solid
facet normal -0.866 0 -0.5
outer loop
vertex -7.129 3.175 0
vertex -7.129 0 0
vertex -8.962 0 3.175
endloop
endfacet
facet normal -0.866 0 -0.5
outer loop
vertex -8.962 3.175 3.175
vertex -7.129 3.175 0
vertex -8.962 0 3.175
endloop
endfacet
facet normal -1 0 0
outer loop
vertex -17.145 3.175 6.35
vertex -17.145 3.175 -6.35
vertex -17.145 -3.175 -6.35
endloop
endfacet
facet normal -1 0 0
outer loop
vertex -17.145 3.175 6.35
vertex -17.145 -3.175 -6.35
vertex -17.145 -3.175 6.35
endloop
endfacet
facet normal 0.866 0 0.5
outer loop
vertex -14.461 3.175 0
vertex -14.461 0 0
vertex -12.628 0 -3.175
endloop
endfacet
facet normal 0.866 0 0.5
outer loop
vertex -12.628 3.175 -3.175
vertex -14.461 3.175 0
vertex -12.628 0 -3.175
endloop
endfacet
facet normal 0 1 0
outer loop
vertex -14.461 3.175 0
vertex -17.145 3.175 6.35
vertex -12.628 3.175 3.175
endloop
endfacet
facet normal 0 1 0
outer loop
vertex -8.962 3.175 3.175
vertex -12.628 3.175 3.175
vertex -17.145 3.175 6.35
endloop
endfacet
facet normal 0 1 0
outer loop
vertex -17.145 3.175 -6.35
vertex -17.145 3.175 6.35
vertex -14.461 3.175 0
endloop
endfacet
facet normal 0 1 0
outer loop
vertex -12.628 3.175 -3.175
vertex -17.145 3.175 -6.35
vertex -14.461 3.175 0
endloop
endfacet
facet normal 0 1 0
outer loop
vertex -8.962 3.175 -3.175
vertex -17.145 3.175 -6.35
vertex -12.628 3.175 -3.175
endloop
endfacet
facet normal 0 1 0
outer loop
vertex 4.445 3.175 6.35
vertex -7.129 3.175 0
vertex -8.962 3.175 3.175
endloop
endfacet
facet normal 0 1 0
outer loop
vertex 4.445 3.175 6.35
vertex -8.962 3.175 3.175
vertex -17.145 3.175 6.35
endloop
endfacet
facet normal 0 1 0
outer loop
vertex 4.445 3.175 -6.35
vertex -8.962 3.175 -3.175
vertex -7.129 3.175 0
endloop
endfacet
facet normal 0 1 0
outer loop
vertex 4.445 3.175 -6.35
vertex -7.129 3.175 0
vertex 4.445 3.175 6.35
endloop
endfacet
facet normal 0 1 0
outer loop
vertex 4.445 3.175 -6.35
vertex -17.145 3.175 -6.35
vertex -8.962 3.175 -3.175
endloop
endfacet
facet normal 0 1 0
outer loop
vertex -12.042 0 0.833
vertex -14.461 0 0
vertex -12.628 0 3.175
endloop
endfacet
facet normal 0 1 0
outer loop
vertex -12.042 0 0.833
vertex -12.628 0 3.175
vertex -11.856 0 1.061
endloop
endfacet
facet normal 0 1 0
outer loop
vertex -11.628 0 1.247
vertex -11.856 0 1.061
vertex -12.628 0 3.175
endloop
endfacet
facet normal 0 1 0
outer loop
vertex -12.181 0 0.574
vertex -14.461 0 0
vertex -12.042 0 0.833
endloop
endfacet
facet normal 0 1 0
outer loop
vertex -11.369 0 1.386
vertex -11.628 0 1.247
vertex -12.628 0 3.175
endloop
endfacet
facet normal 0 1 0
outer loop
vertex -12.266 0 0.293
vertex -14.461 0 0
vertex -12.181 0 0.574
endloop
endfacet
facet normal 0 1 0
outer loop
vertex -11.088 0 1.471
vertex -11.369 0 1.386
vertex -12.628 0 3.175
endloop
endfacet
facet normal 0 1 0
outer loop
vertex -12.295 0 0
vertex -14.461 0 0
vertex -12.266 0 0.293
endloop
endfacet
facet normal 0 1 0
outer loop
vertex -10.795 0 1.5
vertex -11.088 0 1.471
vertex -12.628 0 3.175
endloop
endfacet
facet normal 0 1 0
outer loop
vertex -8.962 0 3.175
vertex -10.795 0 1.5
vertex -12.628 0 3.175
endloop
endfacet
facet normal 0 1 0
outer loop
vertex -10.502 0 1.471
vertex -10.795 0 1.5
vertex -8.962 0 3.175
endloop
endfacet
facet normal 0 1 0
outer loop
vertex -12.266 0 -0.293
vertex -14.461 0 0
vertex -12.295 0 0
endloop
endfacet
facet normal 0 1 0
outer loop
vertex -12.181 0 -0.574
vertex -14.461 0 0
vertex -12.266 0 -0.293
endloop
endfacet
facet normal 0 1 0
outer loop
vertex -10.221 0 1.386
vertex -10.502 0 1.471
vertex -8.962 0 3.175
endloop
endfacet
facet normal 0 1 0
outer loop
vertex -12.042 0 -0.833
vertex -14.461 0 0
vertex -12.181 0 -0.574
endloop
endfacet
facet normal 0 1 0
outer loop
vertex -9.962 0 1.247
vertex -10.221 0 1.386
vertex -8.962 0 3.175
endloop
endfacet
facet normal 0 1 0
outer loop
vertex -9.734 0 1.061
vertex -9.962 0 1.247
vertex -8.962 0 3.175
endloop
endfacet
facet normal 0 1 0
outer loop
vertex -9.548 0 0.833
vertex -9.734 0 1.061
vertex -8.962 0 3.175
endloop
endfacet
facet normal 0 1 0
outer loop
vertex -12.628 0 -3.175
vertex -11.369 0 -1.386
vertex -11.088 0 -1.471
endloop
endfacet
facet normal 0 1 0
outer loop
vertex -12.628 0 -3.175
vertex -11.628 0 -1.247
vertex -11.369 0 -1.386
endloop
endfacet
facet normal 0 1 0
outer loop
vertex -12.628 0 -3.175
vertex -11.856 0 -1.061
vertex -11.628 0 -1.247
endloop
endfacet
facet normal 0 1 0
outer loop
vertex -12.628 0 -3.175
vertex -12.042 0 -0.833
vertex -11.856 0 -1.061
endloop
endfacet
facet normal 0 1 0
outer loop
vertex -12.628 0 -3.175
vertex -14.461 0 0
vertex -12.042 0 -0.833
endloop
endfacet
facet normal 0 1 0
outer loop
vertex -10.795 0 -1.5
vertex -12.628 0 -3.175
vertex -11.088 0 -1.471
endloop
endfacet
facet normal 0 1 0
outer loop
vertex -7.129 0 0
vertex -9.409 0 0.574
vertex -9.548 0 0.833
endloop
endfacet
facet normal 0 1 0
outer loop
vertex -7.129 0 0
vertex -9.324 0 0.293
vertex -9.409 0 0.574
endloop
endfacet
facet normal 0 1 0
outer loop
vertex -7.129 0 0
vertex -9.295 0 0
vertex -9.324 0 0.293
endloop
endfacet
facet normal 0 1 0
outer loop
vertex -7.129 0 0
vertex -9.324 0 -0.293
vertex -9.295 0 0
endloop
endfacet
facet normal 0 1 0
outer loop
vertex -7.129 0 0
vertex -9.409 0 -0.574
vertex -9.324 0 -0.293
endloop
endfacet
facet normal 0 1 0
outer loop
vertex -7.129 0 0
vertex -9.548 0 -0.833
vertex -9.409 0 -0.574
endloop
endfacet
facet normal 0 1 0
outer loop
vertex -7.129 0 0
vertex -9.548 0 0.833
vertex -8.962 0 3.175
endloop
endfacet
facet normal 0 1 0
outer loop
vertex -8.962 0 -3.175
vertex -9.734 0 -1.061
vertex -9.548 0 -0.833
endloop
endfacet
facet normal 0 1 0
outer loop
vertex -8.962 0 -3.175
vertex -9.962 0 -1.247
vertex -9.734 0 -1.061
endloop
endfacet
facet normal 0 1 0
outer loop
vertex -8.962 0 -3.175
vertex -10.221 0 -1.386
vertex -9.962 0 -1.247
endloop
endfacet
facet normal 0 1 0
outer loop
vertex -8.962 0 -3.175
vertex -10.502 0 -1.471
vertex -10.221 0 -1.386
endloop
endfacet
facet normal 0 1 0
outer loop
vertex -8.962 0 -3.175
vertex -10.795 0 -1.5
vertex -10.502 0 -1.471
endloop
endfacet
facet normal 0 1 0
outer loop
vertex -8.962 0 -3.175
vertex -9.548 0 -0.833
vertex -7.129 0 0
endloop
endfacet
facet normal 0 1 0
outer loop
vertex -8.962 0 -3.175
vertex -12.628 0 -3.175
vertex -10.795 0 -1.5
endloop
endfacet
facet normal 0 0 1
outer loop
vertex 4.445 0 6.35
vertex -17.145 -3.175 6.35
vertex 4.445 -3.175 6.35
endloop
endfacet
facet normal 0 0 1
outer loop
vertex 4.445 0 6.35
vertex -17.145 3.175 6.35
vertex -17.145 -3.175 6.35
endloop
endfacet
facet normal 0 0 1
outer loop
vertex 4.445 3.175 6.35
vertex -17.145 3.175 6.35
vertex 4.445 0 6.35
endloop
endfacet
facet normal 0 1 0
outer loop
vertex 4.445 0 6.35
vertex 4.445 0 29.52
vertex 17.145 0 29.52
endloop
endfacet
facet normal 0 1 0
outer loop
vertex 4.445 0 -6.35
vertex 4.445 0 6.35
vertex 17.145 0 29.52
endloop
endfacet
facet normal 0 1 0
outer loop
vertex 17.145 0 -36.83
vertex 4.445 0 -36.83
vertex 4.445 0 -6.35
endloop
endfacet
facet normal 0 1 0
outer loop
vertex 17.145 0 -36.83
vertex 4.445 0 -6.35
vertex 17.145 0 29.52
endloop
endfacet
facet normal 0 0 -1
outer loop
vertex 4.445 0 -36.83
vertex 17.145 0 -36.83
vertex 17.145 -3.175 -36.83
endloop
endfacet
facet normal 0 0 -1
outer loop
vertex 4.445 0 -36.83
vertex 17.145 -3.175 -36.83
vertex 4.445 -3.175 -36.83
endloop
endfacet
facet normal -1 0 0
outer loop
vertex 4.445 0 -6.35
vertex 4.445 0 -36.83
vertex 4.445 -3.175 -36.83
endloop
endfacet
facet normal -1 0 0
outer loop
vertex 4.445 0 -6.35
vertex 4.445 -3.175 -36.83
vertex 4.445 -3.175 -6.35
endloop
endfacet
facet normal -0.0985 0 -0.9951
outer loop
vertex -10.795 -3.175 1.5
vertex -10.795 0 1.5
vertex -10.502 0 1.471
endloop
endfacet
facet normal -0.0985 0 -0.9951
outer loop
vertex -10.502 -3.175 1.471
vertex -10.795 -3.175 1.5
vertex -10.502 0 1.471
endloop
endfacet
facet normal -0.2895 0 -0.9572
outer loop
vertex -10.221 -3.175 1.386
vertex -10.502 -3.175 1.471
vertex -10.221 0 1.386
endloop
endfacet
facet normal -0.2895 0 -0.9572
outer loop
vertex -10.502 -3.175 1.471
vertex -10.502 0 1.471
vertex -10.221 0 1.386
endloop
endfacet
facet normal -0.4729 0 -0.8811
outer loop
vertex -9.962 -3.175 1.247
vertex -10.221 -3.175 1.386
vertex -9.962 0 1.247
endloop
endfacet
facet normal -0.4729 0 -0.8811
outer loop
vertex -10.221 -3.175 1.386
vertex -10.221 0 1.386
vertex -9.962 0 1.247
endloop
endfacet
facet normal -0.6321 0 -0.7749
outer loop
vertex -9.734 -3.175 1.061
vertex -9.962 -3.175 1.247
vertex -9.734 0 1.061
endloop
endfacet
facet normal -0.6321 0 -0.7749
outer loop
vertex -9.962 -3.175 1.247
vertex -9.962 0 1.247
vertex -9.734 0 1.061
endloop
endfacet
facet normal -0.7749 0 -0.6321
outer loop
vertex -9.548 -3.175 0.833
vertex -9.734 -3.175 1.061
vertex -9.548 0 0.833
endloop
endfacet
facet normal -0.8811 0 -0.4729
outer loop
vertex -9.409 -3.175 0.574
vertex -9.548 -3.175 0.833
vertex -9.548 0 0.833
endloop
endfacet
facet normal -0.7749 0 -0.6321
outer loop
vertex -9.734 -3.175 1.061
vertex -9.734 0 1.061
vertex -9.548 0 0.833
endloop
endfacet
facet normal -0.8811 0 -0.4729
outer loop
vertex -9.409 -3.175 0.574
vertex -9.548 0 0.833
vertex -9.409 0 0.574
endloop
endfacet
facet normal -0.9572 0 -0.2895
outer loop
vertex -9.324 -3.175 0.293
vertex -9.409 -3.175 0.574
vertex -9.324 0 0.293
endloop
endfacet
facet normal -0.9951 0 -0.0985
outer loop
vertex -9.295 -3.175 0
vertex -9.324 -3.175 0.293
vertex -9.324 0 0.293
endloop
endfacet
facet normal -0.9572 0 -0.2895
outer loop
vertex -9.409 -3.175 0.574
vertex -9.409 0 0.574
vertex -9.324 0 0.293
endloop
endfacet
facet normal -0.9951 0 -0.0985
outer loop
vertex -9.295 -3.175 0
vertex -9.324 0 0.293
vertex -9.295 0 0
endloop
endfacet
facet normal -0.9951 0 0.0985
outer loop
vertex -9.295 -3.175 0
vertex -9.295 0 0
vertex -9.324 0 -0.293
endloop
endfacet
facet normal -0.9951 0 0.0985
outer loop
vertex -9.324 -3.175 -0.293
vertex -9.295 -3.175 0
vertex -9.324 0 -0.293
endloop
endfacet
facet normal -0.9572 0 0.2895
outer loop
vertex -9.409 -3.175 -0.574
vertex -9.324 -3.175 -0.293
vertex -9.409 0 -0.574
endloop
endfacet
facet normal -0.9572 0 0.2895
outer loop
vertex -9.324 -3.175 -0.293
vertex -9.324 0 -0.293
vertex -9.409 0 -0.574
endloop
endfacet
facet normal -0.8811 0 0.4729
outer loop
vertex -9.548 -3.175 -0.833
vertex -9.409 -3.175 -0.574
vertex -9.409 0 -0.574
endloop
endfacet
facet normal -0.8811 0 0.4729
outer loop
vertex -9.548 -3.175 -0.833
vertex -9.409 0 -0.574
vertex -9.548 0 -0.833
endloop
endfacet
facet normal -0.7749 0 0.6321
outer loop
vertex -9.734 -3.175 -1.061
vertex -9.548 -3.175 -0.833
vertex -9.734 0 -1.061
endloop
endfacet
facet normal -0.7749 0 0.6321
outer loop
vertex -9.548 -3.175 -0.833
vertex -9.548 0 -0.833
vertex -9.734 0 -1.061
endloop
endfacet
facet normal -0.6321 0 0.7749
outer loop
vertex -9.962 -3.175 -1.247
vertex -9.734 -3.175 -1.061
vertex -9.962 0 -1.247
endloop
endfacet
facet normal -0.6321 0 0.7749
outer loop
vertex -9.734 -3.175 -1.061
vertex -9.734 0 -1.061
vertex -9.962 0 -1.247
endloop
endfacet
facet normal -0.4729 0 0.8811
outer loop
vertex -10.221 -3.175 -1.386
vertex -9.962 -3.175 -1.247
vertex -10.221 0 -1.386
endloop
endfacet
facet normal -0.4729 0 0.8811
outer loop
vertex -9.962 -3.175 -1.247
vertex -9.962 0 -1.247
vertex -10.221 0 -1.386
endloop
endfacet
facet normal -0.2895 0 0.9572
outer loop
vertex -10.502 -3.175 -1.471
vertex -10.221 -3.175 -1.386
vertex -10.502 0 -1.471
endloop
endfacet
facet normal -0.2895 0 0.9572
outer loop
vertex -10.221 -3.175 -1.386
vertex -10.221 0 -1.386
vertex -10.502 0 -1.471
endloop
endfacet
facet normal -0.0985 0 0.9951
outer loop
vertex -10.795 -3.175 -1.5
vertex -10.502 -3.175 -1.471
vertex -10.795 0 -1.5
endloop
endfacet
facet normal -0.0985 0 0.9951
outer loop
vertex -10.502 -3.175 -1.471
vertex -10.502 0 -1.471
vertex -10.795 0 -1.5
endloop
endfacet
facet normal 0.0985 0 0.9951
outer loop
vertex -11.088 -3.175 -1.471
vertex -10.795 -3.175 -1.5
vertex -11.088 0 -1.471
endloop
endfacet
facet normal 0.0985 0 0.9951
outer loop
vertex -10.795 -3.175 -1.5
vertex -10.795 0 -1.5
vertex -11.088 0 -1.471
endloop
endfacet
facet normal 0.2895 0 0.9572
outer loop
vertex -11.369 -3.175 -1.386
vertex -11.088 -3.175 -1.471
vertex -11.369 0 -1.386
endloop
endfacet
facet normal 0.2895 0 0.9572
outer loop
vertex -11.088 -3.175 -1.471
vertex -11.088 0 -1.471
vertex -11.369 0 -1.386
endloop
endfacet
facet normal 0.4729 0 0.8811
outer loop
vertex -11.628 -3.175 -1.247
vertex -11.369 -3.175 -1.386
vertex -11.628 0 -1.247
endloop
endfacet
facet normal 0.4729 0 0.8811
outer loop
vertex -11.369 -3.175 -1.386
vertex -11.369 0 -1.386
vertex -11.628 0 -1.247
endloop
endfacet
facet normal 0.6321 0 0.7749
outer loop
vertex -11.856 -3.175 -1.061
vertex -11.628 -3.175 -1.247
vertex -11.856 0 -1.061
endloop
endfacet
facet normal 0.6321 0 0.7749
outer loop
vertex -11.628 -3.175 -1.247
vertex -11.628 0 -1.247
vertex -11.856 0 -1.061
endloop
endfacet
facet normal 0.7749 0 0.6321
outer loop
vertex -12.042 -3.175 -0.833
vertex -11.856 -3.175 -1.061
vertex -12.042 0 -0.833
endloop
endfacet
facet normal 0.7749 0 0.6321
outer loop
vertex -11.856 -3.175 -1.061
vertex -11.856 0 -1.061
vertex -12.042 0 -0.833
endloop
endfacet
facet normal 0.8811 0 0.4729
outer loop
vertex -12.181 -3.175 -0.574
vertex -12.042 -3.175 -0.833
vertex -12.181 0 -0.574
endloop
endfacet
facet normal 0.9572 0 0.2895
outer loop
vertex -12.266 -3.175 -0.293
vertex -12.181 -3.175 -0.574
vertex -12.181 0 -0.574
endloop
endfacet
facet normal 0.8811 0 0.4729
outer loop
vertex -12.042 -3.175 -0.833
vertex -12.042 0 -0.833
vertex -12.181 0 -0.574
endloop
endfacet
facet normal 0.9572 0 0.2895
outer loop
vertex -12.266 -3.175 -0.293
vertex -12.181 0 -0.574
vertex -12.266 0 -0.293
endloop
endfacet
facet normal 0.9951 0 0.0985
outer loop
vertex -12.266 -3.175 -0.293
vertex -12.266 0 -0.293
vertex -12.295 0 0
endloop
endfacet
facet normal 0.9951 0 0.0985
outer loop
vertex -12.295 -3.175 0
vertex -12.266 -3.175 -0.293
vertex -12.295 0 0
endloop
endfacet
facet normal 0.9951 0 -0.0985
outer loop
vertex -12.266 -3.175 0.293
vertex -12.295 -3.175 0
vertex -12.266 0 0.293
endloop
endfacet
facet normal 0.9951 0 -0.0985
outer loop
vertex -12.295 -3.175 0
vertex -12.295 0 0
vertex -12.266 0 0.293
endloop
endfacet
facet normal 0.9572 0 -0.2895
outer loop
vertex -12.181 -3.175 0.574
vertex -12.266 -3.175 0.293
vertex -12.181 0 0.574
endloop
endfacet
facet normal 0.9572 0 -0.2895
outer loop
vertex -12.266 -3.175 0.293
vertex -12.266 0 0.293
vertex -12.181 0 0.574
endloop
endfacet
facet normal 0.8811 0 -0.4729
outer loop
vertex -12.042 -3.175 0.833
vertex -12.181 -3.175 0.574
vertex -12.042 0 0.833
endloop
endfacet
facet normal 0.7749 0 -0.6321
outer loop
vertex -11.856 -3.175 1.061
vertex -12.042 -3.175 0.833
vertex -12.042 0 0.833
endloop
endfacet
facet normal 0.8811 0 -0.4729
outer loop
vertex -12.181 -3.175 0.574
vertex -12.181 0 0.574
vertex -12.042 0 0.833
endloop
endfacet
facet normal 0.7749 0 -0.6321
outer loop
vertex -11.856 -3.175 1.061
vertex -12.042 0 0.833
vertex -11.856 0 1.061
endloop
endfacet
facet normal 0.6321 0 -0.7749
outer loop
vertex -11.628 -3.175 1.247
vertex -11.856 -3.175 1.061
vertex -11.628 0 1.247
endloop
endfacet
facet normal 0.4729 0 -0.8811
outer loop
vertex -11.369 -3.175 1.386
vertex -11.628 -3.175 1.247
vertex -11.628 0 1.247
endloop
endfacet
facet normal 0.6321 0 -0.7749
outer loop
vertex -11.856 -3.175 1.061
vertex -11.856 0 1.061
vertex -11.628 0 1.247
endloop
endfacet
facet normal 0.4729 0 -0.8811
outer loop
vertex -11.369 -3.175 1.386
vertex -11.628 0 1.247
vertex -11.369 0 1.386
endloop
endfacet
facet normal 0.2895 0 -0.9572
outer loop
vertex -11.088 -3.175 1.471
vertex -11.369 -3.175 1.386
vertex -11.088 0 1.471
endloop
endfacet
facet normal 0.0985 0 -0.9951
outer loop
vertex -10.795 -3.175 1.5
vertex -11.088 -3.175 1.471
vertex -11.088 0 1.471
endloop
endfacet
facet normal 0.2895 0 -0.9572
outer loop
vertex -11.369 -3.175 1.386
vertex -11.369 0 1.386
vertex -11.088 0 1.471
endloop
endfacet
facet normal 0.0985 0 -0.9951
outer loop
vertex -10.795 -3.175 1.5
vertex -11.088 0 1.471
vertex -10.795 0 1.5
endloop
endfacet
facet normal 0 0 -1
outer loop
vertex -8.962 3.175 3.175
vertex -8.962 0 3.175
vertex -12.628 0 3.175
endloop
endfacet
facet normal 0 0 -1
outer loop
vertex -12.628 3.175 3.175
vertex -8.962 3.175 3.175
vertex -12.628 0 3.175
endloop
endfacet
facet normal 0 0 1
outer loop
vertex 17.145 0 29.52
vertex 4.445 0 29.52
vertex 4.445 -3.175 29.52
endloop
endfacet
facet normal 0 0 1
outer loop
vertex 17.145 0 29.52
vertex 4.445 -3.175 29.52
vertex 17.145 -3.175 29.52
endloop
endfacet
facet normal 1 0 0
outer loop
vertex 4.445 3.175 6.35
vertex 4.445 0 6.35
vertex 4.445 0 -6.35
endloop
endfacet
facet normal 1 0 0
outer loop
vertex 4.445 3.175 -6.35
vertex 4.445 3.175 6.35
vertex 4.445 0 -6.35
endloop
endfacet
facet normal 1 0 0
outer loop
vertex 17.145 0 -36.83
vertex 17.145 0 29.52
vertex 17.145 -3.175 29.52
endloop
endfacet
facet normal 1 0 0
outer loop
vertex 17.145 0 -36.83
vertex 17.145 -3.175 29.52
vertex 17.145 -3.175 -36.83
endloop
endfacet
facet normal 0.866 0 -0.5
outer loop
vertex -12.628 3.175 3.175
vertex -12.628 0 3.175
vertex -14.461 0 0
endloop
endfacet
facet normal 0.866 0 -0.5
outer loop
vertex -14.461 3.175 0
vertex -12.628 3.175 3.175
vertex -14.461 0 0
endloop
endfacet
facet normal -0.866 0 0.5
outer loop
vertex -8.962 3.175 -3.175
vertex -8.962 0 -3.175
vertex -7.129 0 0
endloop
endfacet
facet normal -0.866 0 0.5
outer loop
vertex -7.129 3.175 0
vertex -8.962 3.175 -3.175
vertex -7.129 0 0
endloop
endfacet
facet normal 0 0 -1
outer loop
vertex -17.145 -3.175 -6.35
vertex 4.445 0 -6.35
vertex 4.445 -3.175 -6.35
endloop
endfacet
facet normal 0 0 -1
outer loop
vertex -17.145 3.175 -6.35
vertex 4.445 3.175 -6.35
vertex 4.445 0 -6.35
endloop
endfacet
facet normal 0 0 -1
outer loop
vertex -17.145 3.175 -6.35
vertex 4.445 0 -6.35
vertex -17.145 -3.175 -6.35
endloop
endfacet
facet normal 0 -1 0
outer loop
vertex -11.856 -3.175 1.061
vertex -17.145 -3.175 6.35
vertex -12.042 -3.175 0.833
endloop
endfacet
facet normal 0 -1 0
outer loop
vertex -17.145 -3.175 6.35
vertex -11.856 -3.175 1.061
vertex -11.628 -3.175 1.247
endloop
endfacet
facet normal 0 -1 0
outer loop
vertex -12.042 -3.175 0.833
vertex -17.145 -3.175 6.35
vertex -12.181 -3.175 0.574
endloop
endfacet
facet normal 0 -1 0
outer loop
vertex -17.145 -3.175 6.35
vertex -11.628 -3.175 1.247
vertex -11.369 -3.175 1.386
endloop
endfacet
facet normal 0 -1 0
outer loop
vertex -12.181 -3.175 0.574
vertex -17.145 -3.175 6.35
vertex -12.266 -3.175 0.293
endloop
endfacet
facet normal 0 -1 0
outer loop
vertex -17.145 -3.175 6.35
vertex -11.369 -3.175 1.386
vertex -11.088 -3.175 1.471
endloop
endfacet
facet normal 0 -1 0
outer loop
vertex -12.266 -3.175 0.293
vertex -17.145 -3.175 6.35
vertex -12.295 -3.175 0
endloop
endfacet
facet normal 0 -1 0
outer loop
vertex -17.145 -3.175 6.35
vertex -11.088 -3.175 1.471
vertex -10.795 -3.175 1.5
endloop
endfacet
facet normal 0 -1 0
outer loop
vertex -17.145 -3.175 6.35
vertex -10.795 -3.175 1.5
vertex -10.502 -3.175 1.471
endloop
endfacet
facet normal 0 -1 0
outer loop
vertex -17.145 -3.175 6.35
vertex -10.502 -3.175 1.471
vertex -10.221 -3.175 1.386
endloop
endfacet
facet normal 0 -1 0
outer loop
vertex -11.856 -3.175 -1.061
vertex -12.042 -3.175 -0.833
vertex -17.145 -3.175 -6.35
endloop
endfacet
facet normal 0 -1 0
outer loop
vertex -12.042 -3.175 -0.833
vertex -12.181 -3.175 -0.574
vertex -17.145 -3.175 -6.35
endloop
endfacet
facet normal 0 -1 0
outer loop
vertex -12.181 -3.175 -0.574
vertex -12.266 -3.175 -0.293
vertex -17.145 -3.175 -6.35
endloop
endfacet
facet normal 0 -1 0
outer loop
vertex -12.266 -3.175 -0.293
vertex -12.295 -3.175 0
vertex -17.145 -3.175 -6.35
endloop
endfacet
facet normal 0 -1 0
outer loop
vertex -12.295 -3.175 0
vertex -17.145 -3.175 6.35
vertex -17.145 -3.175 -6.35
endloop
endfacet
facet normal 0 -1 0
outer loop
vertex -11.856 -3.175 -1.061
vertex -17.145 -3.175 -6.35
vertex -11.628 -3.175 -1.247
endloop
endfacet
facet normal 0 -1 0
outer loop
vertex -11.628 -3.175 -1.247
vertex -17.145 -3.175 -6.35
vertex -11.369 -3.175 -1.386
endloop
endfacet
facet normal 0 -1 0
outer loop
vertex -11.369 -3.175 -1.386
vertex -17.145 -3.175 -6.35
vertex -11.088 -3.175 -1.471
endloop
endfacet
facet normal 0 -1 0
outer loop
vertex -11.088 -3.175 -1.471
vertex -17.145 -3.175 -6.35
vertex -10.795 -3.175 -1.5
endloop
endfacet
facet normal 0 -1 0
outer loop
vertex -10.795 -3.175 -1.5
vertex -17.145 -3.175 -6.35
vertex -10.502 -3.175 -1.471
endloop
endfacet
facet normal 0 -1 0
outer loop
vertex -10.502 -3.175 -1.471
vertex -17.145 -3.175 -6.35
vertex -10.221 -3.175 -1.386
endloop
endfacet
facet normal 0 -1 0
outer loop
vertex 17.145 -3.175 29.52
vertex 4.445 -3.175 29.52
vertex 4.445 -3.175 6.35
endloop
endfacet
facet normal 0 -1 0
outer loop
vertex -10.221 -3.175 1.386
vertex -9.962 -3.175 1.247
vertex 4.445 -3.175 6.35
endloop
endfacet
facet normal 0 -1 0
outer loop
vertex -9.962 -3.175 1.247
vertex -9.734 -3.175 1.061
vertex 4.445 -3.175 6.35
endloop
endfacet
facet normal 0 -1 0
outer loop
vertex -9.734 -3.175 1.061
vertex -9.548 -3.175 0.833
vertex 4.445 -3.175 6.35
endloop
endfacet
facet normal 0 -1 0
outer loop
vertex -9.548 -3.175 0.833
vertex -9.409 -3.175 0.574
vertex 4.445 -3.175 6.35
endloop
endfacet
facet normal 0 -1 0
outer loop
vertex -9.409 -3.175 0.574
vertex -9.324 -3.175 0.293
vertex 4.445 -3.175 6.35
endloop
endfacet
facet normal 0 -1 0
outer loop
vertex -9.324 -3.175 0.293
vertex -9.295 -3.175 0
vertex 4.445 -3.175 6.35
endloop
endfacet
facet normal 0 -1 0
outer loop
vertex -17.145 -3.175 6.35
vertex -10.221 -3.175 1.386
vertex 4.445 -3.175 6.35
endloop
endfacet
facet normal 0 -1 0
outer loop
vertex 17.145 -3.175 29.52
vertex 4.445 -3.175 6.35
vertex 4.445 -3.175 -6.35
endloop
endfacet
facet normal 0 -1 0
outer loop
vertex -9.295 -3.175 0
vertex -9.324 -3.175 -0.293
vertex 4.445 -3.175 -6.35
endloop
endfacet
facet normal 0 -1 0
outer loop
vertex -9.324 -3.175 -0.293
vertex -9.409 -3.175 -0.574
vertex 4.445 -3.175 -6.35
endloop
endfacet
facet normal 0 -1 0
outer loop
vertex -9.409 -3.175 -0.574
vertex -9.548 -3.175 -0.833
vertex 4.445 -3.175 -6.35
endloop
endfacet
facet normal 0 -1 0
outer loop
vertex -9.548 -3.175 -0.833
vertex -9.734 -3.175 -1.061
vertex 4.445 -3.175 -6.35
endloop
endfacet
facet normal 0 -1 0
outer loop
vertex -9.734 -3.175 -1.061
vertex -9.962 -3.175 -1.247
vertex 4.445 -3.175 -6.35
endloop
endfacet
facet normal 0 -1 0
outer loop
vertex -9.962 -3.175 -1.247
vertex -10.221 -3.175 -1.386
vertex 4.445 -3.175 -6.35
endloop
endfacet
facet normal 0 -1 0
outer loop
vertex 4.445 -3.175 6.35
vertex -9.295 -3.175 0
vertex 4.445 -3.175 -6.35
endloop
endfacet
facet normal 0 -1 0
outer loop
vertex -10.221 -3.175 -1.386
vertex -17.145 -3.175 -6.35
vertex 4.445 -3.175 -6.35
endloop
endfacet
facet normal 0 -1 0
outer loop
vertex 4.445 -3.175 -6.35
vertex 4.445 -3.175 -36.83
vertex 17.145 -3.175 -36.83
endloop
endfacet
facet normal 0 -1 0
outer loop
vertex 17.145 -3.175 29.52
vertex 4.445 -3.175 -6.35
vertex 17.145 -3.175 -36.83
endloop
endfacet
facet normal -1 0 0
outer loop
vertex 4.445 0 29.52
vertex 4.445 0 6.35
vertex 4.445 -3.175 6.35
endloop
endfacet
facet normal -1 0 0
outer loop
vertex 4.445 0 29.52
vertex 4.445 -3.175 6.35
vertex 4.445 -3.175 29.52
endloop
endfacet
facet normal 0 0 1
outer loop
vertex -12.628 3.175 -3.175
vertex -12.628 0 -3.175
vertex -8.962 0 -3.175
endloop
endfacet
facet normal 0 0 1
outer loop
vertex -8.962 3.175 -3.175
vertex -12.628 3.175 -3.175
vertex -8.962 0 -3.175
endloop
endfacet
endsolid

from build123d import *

# Parameters (mm, degrees)
SKETCH1_W           = 21.59
SKETCH1_H           = 12.7
BOSS_EXTRUDE3_DEPTH = 3.175
SKETCH1_5_R         = 1.5
BOSS_EXTRUDE4_DEPTH = 3.175


with BuildPart() as part:
    # Sketch1 → Boss-Extrude3 (new body)
    with BuildSketch(Plane(origin=(0, 0, 0), x_dir=(1, 0, 0), z_dir=(0, 1, 0))):
        with Locations((-6.35, 0)):
            Rectangle(SKETCH1_W, SKETCH1_H)
        Polygon((-7.128825791, 0), (-8.961912895, -3.175), (-12.628087105, -3.175), (-14.461174209, 0), (-12.628087105, 3.175), (-8.961912895, 3.175), align=None, mode=Mode.SUBTRACT)
    extrude(amount=BOSS_EXTRUDE3_DEPTH)

    # Sketch1<5> → Boss-Extrude4 (add)
    with BuildSketch(Plane(origin=(0, 0, 0), x_dir=(1, 0, 0), z_dir=(0, 1, 0))):
        Polygon((17.145, -29.52), (17.145, 36.83), (4.445, 36.83), (4.445, 6.35), (-17.145, 6.35), (-17.145, -6.35), (4.445, -6.35), (4.445, -29.52), align=None)
        with Locations((-10.795, 0)):
            Circle(SKETCH1_5_R, mode=Mode.SUBTRACT)
    extrude(amount=-BOSS_EXTRUDE4_DEPTH)


solid = part.part
